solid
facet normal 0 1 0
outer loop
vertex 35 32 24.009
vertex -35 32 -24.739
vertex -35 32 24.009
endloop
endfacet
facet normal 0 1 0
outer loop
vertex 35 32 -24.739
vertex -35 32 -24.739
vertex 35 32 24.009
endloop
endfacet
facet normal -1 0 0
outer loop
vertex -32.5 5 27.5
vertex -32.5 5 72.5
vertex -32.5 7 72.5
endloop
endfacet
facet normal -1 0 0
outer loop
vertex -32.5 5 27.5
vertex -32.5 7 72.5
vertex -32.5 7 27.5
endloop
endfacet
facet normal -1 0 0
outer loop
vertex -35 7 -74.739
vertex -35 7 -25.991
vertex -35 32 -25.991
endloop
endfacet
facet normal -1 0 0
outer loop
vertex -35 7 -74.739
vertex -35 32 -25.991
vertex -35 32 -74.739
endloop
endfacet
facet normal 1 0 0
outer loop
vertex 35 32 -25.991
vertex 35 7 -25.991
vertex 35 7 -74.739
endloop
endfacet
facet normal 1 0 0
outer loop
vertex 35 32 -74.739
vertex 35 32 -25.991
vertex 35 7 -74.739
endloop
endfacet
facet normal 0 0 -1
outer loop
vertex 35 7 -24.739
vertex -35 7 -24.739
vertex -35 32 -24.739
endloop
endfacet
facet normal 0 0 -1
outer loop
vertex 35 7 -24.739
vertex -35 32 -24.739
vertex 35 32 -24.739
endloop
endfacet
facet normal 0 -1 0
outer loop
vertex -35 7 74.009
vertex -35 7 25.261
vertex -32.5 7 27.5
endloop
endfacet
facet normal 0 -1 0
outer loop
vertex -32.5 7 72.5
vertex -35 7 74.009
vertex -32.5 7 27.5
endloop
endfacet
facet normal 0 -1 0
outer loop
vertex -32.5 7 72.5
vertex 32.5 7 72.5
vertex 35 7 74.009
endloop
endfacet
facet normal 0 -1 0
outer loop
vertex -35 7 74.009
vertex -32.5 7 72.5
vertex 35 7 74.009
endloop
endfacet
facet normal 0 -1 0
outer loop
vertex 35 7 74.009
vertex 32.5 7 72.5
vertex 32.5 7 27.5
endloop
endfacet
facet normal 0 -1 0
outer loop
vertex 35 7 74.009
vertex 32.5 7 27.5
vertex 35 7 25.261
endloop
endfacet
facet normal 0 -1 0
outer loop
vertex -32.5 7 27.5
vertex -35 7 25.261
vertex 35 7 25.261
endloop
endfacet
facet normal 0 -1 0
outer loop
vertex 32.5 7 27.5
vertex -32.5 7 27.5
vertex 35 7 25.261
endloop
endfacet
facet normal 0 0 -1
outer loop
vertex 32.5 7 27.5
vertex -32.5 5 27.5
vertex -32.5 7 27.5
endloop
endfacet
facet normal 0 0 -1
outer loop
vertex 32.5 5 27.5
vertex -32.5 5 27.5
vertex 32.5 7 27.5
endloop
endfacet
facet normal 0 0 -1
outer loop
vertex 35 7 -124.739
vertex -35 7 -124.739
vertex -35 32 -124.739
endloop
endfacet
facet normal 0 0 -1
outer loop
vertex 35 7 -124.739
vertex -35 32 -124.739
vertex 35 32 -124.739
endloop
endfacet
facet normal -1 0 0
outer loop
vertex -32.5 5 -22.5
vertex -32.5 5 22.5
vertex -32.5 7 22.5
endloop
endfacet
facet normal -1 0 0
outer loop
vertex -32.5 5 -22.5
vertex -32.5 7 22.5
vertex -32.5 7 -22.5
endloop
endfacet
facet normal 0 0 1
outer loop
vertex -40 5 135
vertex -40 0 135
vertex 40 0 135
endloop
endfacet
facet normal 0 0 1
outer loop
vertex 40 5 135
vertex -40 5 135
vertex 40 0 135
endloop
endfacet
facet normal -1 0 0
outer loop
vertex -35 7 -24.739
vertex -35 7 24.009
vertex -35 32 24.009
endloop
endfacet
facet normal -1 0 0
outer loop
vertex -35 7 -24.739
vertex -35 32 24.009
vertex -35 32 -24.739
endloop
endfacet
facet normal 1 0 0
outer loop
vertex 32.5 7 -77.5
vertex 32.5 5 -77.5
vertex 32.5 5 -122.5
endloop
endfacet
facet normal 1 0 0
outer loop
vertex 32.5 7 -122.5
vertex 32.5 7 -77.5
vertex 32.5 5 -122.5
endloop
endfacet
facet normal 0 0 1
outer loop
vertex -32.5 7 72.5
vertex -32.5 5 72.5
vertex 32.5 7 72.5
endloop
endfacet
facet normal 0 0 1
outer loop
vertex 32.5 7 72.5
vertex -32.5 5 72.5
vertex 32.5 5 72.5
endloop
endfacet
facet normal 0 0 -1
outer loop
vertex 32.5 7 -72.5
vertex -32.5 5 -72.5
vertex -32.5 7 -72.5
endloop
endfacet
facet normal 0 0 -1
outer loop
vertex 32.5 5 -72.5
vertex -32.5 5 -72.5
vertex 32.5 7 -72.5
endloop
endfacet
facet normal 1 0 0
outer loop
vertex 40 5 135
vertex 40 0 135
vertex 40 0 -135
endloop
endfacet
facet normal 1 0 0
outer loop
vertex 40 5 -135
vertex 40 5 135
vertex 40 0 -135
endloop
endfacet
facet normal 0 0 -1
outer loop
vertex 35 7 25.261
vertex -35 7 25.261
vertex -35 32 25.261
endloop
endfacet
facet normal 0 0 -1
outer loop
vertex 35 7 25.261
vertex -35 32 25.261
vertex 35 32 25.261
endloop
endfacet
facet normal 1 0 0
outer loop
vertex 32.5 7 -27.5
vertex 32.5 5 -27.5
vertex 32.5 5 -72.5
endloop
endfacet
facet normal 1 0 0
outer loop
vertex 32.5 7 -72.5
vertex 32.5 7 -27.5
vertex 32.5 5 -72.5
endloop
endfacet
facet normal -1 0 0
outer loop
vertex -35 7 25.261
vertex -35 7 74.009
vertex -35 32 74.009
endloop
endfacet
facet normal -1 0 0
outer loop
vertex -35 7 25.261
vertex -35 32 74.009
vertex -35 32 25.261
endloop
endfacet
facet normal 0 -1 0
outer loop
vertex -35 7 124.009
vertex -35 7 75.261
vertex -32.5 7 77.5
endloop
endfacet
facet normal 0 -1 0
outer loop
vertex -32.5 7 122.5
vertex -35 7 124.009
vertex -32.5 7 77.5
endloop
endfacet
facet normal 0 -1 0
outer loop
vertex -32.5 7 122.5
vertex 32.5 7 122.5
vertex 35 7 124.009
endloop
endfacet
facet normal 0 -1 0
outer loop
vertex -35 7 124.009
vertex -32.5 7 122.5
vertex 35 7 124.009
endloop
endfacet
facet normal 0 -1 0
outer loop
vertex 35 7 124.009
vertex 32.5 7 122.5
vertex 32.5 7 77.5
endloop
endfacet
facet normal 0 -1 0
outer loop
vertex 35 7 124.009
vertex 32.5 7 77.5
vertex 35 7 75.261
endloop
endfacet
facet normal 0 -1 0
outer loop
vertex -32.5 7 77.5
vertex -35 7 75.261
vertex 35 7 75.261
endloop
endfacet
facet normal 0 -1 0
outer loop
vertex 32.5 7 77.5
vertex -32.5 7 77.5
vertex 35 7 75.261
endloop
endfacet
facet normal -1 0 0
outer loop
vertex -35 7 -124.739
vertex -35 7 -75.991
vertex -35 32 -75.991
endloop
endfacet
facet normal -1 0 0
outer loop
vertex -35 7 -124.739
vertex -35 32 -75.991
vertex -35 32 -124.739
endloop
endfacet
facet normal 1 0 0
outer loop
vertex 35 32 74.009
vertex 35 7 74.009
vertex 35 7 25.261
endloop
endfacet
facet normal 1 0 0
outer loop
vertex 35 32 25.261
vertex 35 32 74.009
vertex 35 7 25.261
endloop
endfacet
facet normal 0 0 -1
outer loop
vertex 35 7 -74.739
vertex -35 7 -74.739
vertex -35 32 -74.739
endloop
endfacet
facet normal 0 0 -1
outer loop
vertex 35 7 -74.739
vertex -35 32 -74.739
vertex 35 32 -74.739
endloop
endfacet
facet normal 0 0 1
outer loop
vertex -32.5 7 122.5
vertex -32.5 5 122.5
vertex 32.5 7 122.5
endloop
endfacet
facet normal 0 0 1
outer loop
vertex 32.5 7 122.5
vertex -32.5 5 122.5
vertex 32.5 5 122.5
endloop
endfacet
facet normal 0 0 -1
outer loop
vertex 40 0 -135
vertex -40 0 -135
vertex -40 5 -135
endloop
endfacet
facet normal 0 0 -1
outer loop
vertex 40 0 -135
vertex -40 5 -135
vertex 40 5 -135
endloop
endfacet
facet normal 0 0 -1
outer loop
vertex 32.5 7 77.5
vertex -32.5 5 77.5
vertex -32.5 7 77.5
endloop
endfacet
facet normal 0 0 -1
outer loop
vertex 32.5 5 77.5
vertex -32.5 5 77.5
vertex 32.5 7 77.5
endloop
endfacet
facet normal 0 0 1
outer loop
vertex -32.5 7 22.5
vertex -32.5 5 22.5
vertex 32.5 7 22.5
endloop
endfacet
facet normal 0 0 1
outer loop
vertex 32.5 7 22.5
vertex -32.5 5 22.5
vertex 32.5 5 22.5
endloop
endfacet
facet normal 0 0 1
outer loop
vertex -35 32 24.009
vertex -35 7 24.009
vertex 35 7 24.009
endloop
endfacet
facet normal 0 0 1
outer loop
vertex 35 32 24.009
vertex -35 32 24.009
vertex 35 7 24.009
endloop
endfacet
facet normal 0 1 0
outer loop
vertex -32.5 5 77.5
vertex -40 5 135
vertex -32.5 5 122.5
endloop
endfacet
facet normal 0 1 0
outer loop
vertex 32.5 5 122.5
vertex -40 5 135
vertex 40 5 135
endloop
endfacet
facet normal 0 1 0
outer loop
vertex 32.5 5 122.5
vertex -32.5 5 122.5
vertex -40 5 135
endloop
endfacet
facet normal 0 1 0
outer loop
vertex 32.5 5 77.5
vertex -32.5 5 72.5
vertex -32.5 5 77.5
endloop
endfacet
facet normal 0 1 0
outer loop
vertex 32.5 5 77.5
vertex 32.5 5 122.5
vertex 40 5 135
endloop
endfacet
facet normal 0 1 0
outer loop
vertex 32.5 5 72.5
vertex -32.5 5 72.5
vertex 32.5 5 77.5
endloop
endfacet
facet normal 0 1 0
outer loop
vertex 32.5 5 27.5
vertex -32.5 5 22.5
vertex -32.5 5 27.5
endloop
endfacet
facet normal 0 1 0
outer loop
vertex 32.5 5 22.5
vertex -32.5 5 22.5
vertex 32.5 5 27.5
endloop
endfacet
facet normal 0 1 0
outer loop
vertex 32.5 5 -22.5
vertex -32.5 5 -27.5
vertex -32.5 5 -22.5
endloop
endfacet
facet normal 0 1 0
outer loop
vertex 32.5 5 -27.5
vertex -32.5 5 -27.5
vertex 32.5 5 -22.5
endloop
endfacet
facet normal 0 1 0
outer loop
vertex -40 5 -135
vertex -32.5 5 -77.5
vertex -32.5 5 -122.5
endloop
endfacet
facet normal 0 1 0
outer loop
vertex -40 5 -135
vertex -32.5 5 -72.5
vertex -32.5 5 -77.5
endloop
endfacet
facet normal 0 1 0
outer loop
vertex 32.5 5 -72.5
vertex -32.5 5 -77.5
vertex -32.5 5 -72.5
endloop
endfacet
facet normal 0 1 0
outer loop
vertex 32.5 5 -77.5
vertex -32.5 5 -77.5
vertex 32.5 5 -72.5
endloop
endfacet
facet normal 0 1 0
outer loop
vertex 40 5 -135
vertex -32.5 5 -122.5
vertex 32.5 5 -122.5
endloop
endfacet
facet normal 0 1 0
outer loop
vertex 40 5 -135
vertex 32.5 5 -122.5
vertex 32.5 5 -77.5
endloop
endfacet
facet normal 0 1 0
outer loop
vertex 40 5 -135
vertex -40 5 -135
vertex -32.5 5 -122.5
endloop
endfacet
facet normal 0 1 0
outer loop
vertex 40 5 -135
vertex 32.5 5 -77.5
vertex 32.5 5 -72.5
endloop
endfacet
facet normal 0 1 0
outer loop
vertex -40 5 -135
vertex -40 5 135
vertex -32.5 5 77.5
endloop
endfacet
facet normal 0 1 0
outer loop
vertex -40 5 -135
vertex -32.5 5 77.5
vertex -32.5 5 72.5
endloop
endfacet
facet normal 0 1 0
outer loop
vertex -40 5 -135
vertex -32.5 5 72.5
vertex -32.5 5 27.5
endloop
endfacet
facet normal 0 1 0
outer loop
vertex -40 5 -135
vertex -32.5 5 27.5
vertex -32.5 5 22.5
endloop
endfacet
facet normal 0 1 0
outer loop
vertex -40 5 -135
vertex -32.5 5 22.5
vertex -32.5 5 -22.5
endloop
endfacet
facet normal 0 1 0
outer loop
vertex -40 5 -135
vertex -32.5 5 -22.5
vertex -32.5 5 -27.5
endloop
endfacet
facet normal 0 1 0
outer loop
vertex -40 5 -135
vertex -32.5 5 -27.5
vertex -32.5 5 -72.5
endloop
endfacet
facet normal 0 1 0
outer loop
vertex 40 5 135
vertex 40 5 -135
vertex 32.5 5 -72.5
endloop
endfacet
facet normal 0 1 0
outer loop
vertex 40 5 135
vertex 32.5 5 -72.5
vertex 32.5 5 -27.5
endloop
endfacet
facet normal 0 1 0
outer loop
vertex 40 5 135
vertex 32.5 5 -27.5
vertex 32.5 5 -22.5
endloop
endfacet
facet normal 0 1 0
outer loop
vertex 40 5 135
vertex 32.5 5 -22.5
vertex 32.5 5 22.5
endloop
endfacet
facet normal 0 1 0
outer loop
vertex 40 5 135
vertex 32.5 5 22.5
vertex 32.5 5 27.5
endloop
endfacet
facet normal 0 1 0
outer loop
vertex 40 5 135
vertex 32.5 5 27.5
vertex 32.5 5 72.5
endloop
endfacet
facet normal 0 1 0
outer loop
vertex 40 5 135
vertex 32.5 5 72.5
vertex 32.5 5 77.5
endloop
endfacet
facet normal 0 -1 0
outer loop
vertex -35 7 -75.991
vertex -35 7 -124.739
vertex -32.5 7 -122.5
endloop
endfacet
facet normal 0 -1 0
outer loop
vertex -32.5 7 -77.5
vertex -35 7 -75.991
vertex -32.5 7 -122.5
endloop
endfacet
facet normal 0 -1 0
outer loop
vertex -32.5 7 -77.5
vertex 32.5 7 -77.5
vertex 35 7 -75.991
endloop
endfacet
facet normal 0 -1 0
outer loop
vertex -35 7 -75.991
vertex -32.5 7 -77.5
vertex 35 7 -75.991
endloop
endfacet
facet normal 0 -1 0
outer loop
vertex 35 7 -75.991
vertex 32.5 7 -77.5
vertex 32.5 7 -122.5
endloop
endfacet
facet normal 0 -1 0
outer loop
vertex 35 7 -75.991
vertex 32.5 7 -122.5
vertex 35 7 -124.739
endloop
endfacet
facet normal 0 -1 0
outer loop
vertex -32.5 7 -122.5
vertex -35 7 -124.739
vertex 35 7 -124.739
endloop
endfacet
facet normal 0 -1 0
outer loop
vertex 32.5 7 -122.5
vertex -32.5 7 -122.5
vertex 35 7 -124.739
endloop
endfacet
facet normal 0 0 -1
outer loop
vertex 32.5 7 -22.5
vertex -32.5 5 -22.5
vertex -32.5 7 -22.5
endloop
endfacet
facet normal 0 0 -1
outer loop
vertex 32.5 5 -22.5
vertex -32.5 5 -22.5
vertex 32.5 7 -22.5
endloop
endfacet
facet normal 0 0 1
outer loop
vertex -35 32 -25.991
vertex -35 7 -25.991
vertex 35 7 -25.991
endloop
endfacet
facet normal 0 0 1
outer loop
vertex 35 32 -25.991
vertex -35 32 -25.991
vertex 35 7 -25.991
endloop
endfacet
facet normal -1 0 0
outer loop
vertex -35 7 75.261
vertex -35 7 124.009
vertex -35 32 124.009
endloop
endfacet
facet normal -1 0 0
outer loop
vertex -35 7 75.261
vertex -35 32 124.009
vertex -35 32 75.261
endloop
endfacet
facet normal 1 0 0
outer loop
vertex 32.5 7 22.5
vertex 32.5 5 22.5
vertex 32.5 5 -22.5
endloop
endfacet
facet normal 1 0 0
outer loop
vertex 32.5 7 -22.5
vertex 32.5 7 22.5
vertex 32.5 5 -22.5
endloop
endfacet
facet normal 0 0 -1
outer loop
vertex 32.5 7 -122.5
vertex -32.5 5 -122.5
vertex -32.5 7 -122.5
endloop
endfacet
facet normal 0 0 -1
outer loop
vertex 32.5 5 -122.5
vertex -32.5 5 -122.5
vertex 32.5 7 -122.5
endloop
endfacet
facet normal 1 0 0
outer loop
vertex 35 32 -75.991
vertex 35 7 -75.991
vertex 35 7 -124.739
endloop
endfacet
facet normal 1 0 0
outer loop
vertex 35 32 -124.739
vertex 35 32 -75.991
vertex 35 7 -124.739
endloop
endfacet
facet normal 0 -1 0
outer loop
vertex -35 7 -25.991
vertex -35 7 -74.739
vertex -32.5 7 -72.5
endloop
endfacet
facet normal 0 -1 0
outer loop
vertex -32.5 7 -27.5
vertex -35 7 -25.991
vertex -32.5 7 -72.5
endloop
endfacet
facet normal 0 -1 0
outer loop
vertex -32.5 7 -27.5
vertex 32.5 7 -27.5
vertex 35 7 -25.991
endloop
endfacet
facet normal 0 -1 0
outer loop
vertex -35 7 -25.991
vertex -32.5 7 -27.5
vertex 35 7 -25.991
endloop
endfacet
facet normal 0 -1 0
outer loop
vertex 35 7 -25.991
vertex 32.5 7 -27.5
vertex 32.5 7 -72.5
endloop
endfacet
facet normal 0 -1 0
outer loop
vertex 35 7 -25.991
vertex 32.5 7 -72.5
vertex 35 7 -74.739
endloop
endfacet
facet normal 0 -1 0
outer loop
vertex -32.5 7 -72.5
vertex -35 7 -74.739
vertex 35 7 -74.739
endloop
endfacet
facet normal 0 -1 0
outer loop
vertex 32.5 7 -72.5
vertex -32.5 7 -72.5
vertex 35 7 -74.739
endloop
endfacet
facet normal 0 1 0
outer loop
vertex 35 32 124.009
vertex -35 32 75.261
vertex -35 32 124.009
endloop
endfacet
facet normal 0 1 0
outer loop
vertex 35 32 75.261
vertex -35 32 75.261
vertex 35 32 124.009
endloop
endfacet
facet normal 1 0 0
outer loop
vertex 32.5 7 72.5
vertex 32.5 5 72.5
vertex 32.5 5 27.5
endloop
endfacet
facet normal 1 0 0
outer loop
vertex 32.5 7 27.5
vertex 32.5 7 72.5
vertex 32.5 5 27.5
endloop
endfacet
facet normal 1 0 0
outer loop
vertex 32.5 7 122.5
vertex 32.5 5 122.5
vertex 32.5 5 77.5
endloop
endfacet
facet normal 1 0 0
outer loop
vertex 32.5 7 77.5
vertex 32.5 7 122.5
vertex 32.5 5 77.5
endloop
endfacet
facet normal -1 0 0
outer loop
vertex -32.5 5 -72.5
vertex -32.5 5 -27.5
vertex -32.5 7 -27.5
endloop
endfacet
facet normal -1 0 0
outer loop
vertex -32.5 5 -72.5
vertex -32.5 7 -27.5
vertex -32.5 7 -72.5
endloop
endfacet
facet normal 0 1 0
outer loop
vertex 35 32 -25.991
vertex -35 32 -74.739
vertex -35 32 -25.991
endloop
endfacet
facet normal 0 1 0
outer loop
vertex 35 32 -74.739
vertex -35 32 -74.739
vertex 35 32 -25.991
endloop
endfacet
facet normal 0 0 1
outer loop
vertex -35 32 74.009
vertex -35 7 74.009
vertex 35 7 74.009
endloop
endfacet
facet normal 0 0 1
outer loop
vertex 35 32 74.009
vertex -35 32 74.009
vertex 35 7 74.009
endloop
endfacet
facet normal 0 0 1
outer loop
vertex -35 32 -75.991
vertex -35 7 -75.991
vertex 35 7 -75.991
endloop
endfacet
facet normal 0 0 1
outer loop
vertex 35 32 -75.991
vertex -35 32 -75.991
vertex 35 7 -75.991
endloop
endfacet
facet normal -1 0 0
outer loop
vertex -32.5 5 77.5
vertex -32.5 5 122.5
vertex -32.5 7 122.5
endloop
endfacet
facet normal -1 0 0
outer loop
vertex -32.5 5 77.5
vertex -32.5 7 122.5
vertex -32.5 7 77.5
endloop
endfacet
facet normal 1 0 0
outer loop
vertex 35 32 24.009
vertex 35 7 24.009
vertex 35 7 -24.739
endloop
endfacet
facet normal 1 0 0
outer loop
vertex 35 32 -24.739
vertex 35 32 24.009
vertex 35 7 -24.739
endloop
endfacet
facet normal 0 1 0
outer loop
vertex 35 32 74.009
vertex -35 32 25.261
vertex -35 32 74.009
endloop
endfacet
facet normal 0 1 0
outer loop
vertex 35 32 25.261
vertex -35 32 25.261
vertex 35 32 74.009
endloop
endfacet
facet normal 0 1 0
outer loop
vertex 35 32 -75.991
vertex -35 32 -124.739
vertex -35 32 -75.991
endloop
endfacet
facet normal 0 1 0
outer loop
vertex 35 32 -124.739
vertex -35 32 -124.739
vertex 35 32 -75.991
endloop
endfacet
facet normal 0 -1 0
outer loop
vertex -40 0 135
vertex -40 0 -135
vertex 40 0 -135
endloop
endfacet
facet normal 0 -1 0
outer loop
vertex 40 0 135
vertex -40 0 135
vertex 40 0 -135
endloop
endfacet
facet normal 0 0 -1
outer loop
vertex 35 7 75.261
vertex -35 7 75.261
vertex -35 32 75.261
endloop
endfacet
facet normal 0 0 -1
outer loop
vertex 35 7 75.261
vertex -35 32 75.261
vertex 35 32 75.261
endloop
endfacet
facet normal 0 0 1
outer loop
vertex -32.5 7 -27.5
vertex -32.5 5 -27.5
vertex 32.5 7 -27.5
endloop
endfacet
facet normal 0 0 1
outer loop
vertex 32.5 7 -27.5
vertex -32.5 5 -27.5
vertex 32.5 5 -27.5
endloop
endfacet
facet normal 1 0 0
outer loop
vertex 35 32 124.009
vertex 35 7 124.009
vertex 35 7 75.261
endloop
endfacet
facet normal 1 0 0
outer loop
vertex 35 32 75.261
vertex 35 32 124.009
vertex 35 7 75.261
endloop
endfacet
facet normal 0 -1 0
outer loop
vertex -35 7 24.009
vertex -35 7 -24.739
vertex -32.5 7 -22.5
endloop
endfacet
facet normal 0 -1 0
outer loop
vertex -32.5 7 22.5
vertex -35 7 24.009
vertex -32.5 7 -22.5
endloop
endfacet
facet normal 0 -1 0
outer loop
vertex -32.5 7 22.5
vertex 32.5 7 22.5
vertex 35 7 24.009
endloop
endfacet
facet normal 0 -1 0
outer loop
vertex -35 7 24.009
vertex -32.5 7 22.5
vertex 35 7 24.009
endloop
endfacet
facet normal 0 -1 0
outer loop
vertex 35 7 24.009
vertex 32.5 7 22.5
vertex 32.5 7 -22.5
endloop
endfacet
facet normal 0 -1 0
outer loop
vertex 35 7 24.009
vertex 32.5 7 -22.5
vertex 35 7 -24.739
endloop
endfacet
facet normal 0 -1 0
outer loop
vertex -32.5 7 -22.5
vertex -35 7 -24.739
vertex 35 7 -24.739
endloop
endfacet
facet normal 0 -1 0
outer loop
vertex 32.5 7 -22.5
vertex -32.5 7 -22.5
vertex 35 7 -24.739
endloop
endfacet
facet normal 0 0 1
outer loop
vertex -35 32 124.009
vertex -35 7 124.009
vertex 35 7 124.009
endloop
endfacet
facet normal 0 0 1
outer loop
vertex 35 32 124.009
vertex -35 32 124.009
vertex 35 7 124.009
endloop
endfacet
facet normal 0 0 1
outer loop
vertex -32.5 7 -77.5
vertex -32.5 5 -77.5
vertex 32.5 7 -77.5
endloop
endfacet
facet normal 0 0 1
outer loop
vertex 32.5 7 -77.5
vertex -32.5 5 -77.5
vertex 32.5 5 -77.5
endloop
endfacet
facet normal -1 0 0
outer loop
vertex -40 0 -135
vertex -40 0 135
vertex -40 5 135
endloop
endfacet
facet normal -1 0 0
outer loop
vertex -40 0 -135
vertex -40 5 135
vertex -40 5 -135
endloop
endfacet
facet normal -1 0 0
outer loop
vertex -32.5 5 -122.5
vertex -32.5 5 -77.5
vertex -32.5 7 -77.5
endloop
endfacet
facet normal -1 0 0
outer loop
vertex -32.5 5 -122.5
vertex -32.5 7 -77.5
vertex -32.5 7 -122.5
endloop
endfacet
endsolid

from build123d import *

# Parameters (mm, degrees)
SKETCH1_W           = 80
SKETCH1_H           = 270
BOSS_EXTRUDE1_DEPTH = 5
SKETCH2_W           = 65
SKETCH2_H           = 45
BOSS_EXTRUDE3_DEPTH = 2
LPATTERN1_COUNT     = 5
LPATTERN1_PITCH     = 50
SKETCH3_W           = 70
SKETCH3_H           = 48.748964222
BOSS_EXTRUDE8_DEPTH = 25
LPATTERN5_COUNT     = 5
LPATTERN5_PITCH     = 50


with BuildPart() as part:
    # Sketch1 → Boss-Extrude1 (new body)
    with BuildSketch(Plane(origin=(0, 0, 0), x_dir=(1, 0, 0), z_dir=(0, 1, 0))):
        Rectangle(SKETCH1_W, SKETCH1_H)
    extrude(amount=BOSS_EXTRUDE1_DEPTH)

    # Sketch2 → Boss-Extrude3 (add)
    with BuildSketch(Plane(origin=(0, 5, 0), x_dir=(1, 0, 0), z_dir=(0, 1, 0))):
        with Locations((0, -100)):
            Rectangle(SKETCH2_W, SKETCH2_H)
    boss_extrude3 = extrude(amount=BOSS_EXTRUDE3_DEPTH)

    # LPattern1: Boss-Extrude3 ×5
    with Locations(*[(0, 0, -i * LPATTERN1_PITCH) for i in range(1, LPATTERN1_COUNT)]):
        add(boss_extrude3)

    # Sketch3 → Boss-Extrude8 (add)
    with BuildSketch(Plane(origin=(0, 7, 0), x_dir=(1, 0, 0), z_dir=(0, 1, 0))):
        with Locations((0, -99.635002086)):
            Rectangle(SKETCH3_W, SKETCH3_H)
    boss_extrude8 = extrude(amount=BOSS_EXTRUDE8_DEPTH)

    # LPattern5: Boss-Extrude8 ×5
    with Locations(*[(0, 0, -i * LPATTERN5_PITCH) for i in range(1, LPATTERN5_COUNT)]):
        add(boss_extrude8)


solid = part.part
